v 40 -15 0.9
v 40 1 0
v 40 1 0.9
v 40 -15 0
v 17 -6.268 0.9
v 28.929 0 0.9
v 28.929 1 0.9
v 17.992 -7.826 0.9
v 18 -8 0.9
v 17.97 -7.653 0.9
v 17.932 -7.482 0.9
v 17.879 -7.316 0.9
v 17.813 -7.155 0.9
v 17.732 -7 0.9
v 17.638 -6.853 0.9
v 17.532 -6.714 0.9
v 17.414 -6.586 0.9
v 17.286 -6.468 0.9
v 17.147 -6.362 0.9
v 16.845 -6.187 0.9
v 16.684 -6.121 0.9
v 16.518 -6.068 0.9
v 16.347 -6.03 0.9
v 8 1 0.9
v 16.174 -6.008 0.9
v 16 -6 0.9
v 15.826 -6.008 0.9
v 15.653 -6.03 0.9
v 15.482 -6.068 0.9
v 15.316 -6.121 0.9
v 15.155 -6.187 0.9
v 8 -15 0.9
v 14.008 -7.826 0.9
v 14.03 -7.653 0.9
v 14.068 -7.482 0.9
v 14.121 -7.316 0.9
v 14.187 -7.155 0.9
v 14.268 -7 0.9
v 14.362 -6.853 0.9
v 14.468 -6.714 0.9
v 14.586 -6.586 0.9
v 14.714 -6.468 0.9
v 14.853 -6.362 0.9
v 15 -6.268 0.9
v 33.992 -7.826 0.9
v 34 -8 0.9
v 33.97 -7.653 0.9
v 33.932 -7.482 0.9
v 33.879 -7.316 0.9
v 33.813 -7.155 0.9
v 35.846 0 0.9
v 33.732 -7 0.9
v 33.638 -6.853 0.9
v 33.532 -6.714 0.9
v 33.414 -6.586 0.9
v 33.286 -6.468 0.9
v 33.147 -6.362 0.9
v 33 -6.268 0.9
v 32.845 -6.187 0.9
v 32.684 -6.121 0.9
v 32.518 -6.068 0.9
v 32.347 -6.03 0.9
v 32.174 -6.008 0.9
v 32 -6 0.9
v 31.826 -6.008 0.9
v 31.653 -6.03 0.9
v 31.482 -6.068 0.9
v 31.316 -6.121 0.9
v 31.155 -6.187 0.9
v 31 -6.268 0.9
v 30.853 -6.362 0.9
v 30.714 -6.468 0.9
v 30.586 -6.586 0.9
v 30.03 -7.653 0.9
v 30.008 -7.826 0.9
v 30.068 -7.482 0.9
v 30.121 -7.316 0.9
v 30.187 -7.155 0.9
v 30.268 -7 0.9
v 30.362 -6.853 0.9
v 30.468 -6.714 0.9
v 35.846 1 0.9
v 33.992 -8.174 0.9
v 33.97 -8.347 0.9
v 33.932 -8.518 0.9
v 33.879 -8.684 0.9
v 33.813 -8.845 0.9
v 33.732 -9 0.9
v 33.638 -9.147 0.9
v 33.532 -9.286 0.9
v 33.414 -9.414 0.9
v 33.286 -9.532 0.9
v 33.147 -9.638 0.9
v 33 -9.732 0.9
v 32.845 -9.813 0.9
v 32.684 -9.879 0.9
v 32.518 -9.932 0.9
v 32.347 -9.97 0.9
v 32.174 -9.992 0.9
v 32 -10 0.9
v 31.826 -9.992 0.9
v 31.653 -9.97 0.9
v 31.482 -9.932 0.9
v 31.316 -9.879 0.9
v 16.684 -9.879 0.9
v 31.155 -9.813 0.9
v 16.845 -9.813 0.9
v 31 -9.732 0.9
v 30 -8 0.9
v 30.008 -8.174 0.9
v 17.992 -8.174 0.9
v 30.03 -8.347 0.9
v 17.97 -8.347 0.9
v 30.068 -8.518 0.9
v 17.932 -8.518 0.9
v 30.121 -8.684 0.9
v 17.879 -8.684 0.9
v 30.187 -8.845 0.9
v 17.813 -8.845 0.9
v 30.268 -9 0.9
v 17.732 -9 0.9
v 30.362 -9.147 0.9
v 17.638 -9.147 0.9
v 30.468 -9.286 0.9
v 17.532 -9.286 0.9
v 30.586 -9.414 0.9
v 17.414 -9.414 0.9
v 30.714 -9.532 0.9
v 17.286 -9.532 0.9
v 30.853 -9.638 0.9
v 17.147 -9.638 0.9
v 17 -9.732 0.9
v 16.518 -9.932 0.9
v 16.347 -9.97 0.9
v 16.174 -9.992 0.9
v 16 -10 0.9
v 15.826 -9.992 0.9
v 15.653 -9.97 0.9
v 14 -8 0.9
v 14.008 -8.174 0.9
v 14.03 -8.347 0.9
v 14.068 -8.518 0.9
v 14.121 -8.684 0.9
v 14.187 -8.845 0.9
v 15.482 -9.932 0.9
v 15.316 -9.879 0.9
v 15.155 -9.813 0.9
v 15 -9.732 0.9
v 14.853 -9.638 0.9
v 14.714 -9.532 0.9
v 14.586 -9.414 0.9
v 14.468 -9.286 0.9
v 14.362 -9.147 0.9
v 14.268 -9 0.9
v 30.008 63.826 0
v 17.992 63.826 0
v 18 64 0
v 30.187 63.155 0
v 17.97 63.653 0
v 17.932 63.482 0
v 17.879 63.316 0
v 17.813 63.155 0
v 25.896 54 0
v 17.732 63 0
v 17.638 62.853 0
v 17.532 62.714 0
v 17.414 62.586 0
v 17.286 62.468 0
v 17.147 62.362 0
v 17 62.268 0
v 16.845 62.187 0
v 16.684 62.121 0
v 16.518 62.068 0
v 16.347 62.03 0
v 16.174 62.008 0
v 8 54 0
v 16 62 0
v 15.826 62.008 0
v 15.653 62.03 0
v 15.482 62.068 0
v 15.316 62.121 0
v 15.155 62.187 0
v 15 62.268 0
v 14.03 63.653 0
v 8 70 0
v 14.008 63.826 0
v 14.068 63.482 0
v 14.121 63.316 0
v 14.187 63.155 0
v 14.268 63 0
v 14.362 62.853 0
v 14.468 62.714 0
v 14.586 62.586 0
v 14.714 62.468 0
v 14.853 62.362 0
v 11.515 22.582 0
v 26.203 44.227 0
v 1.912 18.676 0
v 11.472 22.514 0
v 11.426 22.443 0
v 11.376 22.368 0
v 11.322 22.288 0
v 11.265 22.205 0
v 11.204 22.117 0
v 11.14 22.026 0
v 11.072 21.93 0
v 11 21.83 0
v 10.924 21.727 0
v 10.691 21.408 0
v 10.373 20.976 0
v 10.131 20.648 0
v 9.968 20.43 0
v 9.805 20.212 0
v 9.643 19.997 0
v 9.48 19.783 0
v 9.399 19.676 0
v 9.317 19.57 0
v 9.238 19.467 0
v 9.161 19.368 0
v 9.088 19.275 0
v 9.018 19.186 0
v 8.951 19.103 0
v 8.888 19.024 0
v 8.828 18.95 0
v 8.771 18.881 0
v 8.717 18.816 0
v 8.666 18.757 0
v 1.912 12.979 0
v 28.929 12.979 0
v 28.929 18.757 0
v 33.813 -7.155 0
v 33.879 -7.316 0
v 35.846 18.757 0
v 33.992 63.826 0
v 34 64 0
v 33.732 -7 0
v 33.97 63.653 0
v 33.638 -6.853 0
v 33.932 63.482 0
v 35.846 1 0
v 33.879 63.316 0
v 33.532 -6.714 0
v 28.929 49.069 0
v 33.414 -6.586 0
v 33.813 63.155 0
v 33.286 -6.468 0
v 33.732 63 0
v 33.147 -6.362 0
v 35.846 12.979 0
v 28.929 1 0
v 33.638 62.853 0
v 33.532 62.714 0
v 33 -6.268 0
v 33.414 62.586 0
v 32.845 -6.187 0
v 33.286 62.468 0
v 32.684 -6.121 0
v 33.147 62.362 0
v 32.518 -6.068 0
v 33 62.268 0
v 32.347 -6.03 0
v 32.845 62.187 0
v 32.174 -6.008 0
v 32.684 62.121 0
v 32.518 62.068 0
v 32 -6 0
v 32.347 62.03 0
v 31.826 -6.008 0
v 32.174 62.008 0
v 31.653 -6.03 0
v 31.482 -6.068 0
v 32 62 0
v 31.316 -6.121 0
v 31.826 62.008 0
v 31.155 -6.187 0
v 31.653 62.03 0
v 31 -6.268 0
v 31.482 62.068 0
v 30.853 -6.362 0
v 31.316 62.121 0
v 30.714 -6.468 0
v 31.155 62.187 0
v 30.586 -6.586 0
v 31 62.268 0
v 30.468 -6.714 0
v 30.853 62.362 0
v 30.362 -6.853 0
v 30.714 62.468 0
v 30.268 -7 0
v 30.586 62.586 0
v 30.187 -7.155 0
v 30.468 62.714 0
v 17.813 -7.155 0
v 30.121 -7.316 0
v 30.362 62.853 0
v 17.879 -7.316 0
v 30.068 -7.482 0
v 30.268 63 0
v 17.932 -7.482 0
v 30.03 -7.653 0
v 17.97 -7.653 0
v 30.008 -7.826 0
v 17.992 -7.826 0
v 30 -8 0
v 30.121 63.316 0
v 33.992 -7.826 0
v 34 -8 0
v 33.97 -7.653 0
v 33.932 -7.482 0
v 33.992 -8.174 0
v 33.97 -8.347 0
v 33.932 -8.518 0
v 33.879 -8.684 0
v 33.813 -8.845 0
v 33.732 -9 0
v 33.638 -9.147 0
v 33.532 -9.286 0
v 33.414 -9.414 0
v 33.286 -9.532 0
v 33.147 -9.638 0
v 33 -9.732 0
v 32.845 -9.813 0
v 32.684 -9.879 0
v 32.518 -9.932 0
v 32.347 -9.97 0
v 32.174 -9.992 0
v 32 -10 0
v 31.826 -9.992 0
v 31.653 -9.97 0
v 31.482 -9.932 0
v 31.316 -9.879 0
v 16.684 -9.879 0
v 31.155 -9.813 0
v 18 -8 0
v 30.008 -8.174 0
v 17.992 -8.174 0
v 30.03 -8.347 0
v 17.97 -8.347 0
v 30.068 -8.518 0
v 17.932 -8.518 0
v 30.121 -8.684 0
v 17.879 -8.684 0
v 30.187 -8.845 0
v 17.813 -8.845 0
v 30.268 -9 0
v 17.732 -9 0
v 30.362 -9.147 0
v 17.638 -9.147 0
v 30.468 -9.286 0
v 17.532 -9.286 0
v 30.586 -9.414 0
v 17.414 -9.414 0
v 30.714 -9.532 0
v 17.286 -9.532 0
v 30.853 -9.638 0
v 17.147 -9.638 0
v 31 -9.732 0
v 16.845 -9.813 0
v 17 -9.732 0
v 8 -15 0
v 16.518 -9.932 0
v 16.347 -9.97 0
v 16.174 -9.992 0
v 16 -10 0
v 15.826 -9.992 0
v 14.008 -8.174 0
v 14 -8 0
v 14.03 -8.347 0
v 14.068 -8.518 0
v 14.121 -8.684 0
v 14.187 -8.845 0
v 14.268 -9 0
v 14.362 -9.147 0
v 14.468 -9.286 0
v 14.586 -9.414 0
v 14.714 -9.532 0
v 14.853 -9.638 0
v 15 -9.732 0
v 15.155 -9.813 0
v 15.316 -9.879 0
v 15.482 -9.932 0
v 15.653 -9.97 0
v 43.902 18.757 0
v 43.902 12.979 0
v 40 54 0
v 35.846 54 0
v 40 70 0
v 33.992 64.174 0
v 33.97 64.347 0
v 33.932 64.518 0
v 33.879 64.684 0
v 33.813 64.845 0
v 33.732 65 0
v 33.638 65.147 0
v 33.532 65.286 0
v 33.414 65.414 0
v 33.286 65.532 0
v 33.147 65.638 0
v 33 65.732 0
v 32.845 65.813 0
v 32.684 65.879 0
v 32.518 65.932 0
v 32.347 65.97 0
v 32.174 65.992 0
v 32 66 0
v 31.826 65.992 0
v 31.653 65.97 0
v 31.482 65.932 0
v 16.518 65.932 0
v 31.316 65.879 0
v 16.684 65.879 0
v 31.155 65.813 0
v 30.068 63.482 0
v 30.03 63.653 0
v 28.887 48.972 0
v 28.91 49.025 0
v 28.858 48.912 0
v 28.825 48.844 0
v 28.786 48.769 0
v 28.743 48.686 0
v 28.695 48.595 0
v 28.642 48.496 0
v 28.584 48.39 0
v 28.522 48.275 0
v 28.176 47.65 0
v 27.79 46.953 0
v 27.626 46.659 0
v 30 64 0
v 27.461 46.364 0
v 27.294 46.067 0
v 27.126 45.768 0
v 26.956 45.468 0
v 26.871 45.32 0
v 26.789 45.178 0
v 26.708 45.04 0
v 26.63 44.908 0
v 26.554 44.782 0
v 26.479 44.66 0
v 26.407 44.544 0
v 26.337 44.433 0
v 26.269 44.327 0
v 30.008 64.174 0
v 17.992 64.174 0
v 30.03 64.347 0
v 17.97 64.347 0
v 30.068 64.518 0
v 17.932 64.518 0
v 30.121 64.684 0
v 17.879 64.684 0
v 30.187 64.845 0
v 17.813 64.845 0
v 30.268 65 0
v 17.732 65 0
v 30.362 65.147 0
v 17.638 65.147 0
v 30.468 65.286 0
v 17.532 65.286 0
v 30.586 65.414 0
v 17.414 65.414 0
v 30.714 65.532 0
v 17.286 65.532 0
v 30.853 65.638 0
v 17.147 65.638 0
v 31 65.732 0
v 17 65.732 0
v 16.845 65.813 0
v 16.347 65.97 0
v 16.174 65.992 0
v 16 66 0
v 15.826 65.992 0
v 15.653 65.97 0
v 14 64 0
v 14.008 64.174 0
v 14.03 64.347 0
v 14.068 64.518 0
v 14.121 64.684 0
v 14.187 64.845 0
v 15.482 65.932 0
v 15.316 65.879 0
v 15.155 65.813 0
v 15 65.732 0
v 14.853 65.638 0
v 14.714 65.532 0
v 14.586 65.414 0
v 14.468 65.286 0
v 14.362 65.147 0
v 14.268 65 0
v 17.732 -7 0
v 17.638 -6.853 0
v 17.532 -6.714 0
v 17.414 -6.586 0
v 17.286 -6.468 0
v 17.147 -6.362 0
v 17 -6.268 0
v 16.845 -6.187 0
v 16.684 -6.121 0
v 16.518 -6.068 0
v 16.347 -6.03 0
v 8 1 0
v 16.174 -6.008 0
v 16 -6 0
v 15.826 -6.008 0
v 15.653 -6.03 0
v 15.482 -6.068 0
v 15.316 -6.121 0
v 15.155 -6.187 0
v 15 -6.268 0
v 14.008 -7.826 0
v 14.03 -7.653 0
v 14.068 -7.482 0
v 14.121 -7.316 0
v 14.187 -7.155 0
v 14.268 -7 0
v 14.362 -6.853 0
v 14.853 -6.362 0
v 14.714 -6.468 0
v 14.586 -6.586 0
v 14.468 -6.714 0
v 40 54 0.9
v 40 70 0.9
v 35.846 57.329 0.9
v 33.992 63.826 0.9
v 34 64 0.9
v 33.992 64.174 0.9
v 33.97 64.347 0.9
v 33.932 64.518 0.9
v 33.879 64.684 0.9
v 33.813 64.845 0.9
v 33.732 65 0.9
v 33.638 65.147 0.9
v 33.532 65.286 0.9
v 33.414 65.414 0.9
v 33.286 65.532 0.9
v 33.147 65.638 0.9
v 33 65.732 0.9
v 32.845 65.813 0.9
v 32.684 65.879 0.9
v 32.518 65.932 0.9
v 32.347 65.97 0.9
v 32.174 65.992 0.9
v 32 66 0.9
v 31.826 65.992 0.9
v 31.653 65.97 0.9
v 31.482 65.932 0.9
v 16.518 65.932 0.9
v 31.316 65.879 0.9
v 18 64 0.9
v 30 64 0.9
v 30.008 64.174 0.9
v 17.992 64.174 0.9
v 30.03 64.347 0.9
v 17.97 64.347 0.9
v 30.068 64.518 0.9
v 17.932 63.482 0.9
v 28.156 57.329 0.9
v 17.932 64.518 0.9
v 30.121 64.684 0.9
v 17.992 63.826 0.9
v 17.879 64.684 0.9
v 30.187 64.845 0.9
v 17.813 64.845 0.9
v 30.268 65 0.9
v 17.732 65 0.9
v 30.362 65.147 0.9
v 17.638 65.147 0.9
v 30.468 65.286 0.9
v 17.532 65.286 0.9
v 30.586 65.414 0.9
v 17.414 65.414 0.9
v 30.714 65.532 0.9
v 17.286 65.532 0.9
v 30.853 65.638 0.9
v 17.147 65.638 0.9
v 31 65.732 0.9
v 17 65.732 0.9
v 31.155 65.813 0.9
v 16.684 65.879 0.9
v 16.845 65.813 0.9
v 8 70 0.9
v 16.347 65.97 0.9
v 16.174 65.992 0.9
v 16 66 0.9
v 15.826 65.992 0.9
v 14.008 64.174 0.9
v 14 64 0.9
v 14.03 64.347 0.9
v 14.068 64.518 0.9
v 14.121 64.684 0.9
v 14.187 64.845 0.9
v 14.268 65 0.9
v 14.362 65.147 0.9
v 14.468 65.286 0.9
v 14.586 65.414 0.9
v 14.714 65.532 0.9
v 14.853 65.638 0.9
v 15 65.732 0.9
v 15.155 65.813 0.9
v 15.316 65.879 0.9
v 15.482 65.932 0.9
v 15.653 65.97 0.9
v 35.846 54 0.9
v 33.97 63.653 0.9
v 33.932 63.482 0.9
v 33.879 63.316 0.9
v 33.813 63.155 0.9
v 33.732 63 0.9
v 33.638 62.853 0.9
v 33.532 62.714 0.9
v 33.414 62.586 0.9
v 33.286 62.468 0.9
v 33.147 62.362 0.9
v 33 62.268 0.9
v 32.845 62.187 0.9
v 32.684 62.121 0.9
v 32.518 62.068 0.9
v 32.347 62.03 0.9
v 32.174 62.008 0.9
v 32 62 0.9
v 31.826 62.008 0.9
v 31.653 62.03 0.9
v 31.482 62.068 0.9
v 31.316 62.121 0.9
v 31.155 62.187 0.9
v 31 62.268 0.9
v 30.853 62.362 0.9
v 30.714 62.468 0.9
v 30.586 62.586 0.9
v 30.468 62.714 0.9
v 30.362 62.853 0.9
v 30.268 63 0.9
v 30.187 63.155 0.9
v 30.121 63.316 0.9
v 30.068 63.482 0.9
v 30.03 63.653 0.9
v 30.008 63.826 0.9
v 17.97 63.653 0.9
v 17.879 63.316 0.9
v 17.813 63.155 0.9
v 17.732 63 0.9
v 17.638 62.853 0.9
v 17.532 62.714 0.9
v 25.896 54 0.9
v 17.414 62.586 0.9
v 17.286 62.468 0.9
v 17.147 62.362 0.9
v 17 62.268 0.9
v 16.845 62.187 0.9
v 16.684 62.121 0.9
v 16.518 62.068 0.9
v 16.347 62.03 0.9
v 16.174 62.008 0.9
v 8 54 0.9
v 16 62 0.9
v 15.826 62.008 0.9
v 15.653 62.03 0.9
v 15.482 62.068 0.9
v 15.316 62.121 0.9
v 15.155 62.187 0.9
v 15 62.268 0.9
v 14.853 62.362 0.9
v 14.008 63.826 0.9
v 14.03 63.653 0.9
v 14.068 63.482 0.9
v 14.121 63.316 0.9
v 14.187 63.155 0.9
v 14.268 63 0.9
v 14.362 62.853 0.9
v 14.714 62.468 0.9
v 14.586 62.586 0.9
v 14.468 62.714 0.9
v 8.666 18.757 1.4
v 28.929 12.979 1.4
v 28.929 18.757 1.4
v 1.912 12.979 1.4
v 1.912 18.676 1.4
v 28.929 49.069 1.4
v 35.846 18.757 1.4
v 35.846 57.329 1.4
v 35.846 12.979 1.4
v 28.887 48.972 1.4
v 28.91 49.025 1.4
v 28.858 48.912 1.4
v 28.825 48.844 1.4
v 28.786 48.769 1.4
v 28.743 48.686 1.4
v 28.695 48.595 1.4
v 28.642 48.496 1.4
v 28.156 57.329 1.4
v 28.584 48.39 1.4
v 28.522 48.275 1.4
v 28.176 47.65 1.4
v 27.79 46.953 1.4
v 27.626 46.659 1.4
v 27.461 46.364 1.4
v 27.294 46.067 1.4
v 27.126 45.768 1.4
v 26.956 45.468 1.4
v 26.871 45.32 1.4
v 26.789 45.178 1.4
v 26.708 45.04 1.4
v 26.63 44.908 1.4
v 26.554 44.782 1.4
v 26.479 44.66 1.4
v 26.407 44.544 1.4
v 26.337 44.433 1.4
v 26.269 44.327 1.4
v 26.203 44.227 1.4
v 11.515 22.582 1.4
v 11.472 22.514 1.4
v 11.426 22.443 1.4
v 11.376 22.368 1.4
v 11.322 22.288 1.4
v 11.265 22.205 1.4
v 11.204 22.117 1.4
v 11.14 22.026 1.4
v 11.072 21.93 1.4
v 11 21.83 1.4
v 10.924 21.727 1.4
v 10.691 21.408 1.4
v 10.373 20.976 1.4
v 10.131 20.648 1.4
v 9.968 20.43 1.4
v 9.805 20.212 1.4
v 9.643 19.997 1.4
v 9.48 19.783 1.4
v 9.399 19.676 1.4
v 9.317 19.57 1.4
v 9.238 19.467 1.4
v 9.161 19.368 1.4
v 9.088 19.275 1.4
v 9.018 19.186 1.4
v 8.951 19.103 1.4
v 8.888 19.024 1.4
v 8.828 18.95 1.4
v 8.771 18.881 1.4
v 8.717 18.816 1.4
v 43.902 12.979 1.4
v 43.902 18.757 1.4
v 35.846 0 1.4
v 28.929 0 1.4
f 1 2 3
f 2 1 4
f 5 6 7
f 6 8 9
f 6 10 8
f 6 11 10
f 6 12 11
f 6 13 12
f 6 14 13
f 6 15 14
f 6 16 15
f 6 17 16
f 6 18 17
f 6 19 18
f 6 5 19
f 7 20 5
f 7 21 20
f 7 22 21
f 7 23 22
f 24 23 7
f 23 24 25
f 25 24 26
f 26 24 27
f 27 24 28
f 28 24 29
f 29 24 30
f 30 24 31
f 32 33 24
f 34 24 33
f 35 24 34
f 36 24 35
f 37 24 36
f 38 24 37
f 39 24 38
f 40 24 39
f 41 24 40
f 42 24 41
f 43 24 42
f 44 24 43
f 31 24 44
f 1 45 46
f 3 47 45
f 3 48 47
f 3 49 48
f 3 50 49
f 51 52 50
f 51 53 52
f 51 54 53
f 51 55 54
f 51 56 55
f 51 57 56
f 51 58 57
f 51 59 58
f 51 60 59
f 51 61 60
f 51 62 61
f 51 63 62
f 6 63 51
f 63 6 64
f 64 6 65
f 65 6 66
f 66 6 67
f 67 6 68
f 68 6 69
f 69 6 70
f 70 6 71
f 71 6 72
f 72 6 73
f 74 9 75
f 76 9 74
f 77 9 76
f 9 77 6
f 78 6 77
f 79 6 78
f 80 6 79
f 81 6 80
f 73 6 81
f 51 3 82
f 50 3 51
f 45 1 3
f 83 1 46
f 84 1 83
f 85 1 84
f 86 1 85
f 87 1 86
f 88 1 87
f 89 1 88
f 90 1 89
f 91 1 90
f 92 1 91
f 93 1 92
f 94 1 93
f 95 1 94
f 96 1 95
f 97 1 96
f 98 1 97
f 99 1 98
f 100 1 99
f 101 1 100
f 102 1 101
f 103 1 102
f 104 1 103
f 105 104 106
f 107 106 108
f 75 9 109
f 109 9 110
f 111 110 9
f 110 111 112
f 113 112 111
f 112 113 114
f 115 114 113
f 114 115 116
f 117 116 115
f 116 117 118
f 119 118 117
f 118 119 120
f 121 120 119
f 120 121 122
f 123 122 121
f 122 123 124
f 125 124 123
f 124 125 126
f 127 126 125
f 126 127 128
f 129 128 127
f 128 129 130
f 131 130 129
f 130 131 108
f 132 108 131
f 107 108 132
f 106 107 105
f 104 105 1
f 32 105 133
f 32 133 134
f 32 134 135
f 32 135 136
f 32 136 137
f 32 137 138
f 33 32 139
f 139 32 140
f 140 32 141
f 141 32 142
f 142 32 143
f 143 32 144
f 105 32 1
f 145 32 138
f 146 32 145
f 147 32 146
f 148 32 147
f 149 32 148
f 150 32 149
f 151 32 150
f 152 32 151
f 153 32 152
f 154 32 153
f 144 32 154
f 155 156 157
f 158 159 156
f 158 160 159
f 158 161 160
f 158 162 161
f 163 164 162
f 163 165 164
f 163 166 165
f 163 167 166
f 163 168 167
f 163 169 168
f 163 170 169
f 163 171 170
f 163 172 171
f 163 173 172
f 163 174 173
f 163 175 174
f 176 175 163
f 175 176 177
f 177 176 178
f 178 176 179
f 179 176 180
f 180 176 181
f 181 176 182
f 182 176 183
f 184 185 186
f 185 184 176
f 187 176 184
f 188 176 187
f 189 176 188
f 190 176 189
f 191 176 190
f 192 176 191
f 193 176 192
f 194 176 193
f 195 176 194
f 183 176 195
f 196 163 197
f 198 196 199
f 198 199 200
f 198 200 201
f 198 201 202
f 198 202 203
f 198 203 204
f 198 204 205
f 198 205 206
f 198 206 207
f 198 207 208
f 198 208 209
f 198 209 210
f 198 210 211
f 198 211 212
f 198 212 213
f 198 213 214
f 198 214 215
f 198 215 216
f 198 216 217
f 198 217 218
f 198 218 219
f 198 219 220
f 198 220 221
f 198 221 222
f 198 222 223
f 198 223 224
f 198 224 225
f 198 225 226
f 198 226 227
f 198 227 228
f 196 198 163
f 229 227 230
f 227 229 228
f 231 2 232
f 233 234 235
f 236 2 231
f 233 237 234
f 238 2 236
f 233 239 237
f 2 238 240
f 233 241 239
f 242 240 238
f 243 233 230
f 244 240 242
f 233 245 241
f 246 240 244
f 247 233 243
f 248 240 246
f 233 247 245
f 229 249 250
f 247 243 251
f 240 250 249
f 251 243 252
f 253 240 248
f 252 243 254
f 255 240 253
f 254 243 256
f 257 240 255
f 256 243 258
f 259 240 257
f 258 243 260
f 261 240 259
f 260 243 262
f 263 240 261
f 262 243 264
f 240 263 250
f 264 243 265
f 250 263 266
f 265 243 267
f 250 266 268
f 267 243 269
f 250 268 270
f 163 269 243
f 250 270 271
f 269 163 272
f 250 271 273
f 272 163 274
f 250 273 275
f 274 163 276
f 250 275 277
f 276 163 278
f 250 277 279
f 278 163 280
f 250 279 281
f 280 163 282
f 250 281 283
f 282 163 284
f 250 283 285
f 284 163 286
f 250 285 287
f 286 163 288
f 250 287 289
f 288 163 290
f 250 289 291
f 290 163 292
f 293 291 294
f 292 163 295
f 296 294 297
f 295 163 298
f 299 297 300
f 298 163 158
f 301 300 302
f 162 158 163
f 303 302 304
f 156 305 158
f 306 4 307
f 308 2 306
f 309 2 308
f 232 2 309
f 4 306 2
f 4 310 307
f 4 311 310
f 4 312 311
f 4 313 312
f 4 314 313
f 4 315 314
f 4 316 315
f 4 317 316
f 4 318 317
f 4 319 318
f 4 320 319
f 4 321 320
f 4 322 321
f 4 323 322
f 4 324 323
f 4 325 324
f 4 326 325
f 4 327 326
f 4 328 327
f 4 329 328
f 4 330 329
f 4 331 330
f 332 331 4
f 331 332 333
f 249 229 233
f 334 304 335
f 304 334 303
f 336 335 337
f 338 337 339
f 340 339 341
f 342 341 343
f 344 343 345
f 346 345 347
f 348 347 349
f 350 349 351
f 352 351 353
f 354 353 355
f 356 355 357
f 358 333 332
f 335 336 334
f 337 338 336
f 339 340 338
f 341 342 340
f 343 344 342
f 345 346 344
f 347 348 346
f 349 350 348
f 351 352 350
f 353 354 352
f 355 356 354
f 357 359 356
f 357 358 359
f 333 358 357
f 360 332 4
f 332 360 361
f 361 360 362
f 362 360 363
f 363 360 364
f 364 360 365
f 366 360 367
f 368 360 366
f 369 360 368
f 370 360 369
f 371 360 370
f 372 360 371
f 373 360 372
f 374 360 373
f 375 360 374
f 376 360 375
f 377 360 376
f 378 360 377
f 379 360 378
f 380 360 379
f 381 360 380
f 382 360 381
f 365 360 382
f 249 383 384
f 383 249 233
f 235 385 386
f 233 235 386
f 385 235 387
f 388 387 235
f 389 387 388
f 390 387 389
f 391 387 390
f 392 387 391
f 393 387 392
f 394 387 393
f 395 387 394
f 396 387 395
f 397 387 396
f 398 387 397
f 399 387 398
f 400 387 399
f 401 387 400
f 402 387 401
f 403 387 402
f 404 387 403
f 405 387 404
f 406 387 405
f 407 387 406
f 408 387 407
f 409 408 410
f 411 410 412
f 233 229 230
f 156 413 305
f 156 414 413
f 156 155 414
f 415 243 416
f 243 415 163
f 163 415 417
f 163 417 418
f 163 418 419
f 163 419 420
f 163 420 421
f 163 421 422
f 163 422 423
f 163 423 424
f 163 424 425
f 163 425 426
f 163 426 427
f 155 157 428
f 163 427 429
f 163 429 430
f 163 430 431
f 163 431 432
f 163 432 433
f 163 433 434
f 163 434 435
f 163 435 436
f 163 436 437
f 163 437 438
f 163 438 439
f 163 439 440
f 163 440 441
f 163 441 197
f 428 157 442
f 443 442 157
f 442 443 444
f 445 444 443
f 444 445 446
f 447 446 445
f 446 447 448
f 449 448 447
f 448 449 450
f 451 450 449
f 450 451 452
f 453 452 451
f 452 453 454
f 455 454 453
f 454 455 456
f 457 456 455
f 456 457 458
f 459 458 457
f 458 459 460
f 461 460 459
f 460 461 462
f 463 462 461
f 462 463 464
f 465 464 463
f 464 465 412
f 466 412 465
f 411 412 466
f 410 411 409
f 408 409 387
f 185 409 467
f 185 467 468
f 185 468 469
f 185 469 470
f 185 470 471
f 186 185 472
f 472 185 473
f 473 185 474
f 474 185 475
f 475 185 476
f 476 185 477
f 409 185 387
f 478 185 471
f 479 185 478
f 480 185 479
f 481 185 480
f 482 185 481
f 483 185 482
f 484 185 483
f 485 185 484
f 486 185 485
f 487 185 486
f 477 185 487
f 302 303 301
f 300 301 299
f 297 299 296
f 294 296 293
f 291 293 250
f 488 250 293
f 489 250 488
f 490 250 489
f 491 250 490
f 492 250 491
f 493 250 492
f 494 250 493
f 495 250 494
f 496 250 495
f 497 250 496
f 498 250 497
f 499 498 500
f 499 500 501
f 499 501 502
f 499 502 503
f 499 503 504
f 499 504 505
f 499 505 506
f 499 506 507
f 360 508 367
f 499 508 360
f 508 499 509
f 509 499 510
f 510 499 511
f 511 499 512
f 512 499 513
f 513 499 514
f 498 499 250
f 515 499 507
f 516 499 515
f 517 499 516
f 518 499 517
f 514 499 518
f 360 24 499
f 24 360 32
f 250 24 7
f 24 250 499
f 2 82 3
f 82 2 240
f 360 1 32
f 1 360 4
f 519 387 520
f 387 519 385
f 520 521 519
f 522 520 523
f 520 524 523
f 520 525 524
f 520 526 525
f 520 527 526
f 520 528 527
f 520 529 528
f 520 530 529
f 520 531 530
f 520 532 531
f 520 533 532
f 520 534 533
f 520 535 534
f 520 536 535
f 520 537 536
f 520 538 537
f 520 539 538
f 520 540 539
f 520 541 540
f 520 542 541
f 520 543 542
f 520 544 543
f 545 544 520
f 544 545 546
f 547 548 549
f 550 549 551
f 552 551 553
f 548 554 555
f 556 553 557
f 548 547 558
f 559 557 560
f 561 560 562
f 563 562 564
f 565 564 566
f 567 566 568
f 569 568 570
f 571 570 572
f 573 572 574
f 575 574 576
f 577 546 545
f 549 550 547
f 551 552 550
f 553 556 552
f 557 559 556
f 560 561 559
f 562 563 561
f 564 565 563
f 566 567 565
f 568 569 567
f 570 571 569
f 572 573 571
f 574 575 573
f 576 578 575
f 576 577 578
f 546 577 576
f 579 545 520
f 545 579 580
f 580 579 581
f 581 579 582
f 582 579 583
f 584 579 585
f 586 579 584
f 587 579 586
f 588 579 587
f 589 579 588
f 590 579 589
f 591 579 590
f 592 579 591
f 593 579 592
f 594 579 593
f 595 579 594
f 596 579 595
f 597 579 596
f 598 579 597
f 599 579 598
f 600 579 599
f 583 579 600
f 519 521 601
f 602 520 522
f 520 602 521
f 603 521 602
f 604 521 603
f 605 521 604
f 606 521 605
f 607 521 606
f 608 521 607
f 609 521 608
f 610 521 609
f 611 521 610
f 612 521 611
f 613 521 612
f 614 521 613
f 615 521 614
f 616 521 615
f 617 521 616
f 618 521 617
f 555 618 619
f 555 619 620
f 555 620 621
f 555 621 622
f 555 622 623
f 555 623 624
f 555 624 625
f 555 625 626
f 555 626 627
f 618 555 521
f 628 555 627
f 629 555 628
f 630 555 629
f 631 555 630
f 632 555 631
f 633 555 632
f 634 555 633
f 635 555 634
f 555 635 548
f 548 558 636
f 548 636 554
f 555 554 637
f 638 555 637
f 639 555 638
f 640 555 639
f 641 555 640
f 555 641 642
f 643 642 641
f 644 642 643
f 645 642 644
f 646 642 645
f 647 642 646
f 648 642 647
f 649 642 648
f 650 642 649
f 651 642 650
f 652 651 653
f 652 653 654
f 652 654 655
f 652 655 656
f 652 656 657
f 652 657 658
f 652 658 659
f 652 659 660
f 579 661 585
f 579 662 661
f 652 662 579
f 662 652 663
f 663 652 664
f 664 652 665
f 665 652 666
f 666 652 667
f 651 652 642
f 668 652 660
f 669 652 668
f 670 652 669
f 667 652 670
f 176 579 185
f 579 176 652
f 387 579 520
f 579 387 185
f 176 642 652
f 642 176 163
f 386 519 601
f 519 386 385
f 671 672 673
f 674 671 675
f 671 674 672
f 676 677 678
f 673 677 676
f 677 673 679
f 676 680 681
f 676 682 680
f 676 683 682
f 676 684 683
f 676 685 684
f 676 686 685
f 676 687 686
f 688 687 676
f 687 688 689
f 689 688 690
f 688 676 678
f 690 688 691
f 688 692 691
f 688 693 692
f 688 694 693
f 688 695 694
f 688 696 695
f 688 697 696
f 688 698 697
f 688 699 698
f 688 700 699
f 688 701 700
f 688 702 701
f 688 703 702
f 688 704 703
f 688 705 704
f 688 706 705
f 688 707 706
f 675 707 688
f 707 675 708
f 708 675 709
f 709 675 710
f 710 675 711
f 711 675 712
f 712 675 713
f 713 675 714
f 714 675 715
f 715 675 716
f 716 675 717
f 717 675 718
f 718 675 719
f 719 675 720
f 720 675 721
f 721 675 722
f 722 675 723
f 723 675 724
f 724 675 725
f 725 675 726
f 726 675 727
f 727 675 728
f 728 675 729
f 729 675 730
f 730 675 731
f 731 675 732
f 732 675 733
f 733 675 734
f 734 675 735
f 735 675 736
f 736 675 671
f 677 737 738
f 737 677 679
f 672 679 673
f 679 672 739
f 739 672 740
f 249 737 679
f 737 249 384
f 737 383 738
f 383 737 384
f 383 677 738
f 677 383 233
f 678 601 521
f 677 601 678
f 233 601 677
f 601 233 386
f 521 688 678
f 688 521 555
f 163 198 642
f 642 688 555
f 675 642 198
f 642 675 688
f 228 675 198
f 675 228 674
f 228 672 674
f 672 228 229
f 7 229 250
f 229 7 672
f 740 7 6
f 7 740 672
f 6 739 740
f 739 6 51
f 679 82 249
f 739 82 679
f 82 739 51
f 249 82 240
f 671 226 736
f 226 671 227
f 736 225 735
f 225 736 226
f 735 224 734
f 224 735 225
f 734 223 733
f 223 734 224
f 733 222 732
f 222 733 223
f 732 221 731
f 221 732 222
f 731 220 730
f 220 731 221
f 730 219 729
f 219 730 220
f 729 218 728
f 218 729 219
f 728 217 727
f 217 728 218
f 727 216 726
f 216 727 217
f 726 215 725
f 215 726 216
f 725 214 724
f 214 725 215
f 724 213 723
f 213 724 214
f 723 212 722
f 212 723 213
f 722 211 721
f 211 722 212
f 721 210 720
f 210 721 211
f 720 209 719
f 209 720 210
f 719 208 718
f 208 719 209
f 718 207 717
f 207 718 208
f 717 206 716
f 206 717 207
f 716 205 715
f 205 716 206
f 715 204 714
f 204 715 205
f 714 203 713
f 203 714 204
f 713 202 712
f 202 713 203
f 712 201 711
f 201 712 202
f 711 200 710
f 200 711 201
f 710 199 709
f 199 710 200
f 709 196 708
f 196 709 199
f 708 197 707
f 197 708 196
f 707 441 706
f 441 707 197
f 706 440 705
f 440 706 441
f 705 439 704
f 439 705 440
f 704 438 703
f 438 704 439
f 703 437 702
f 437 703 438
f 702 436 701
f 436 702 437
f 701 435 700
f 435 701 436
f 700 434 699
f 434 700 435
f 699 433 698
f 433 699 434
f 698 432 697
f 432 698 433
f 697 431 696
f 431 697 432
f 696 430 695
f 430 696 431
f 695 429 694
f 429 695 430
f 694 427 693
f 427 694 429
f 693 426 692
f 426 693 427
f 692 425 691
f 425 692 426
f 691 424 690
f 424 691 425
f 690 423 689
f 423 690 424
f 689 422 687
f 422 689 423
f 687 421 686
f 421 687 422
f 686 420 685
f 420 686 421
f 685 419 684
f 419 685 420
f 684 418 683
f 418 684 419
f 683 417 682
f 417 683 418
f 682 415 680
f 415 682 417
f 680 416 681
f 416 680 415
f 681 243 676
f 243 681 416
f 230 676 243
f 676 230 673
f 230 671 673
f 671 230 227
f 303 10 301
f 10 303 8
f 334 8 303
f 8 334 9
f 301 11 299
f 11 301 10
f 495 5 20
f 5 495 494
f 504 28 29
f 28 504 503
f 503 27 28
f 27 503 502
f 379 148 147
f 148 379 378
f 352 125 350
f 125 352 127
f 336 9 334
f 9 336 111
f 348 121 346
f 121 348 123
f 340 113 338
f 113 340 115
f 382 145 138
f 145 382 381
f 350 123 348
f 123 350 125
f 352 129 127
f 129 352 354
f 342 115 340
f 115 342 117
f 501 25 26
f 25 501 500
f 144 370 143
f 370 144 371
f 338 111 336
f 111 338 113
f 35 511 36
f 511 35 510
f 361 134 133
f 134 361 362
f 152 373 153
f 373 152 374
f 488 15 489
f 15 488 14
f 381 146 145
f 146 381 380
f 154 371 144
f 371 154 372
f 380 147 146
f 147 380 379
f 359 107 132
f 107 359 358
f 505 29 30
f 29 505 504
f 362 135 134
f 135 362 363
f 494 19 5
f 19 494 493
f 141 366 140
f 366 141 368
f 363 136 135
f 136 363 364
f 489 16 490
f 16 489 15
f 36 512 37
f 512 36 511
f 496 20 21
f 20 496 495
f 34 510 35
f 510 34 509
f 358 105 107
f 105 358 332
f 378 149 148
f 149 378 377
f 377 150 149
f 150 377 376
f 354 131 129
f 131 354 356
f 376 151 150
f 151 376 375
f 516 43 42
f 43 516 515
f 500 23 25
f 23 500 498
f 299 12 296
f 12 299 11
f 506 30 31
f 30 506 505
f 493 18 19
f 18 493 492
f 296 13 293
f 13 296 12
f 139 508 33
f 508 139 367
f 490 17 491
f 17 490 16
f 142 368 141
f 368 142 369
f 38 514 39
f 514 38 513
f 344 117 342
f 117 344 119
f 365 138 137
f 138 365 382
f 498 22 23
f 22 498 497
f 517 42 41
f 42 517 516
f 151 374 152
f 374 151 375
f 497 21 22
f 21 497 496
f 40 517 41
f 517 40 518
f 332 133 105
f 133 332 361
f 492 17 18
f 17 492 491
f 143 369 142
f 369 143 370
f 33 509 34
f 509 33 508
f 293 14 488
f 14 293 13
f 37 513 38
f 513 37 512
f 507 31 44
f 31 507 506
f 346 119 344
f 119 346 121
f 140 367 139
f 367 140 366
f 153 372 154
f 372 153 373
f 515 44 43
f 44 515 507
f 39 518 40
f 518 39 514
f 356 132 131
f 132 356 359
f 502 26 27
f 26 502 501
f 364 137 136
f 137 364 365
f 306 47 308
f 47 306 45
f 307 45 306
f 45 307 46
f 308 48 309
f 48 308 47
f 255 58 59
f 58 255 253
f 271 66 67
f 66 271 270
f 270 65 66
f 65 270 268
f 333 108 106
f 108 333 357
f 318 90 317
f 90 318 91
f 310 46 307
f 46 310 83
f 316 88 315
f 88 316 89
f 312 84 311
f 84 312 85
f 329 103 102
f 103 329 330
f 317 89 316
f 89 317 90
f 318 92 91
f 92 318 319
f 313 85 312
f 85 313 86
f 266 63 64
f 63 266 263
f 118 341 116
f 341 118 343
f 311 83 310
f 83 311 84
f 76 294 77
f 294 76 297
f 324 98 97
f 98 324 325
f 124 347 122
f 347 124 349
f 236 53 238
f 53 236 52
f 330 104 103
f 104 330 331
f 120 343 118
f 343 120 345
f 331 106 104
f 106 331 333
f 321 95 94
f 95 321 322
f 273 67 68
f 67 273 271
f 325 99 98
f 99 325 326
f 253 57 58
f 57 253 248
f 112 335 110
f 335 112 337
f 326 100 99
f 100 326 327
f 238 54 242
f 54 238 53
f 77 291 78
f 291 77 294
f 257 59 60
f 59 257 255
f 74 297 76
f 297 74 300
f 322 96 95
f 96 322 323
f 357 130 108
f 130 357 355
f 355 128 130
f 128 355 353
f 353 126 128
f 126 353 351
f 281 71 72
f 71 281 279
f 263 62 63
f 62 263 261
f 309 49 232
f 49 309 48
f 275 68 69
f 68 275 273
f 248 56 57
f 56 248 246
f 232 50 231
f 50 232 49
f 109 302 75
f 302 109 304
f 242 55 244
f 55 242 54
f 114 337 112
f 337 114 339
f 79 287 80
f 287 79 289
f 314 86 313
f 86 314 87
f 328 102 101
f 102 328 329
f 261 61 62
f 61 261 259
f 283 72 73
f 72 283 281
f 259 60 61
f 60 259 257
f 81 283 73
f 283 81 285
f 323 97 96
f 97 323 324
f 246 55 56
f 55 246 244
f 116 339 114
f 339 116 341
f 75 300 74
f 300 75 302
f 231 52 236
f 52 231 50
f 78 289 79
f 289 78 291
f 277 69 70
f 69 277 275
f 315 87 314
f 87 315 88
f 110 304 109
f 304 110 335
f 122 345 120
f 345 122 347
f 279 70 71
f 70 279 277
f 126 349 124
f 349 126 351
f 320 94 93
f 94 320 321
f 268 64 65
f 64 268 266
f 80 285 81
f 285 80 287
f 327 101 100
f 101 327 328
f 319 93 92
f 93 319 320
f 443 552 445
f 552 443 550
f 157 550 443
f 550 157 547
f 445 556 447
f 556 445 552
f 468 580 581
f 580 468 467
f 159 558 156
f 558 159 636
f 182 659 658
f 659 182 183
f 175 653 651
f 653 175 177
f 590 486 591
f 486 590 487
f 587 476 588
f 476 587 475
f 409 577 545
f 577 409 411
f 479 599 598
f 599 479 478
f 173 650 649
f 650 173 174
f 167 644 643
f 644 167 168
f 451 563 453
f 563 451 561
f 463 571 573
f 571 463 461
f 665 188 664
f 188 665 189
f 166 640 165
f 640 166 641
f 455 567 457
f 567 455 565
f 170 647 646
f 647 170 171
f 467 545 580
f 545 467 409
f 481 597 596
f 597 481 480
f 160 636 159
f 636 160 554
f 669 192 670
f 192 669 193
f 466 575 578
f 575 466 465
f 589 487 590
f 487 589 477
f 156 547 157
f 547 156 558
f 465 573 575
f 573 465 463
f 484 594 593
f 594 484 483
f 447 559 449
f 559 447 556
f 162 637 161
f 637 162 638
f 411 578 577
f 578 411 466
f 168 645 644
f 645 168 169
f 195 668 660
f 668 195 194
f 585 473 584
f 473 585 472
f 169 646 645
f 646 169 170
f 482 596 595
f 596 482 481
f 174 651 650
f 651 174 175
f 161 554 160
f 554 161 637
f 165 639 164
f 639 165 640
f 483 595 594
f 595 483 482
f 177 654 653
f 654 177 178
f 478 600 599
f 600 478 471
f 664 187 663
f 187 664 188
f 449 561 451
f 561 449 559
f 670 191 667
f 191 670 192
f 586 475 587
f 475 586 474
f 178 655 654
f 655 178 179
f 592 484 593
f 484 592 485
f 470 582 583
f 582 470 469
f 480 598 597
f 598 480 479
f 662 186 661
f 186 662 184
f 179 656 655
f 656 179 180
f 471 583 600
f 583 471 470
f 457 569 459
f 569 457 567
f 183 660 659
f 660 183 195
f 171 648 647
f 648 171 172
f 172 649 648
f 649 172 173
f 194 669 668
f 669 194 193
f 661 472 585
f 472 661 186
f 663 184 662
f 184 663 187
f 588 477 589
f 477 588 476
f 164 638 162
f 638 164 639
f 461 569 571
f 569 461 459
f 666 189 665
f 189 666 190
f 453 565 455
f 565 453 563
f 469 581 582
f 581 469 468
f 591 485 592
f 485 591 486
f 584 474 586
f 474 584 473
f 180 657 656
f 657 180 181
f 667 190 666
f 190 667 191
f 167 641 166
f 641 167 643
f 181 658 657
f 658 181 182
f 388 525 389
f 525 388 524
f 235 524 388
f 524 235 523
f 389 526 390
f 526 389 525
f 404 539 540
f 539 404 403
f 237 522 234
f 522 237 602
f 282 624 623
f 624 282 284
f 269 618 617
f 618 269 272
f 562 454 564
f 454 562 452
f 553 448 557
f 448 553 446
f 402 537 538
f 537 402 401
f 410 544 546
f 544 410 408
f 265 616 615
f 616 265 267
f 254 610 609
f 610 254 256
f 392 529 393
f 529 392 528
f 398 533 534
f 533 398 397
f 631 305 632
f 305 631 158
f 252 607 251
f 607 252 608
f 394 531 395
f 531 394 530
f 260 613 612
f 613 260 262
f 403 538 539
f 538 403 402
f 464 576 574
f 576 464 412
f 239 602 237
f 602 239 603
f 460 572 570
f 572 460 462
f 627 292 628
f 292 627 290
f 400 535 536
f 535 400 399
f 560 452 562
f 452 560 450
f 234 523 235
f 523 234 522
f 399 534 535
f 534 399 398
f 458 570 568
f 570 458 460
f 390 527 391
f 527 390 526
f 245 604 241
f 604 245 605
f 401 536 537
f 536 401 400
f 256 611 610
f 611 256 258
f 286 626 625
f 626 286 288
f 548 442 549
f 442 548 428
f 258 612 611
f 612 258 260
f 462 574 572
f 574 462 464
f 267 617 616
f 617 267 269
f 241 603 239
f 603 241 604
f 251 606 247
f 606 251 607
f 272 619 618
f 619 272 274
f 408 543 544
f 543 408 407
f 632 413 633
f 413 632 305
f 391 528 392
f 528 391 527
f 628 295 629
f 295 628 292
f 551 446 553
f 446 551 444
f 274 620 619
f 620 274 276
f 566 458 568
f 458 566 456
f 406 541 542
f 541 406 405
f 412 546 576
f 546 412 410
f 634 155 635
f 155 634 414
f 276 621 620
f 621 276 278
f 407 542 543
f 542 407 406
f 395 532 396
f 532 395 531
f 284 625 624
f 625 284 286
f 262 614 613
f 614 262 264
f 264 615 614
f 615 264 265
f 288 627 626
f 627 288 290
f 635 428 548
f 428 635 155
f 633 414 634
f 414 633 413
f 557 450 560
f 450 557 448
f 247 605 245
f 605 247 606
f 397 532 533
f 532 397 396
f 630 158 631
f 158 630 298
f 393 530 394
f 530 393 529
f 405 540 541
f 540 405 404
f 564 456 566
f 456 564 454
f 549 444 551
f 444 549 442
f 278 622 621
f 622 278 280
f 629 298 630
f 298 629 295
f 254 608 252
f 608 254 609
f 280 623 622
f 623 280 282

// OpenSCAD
Label = "12547";
Height = 52;
Length = 220;
Offset = 0;
TopOffset = 64;
BracketWidth = 32;


BracketThickness = 0.9;
LetterThickness = 1.4;

$fn = 72;

HorizontalOffsetFactor = 4;
VerticalOffsetFactor = 9.0;
Scale = 6;

Letter("4");

module Letter(s) {
    difference() {
        union() {
            translate([Scale*HorizontalOffsetFactor-16,-15,0])
                cube([32,16,BracketThickness]);
            translate([Scale*HorizontalOffsetFactor-16,
                       Scale*VerticalOffsetFactor,0])
                cube([32,16,BracketThickness]);
            scale([Scale, Scale, 1.0])
              linear_extrude(height=LetterThickness)        
                text(s, center=true);
        }
        
        translate([Scale*HorizontalOffsetFactor-8,-8,-1])
            cylinder(r=2,h=BracketThickness+2);
        translate([Scale*HorizontalOffsetFactor+8,-8,-1])
            cylinder(r=2,h=BracketThickness+2);
        
        translate([Scale*HorizontalOffsetFactor-8,TopOffset,-1])
            cylinder(r=2,h=BracketThickness+2);
        translate([Scale*HorizontalOffsetFactor+8,TopOffset,-1])
            cylinder(r=2,h=BracketThickness+2);
    }
}
